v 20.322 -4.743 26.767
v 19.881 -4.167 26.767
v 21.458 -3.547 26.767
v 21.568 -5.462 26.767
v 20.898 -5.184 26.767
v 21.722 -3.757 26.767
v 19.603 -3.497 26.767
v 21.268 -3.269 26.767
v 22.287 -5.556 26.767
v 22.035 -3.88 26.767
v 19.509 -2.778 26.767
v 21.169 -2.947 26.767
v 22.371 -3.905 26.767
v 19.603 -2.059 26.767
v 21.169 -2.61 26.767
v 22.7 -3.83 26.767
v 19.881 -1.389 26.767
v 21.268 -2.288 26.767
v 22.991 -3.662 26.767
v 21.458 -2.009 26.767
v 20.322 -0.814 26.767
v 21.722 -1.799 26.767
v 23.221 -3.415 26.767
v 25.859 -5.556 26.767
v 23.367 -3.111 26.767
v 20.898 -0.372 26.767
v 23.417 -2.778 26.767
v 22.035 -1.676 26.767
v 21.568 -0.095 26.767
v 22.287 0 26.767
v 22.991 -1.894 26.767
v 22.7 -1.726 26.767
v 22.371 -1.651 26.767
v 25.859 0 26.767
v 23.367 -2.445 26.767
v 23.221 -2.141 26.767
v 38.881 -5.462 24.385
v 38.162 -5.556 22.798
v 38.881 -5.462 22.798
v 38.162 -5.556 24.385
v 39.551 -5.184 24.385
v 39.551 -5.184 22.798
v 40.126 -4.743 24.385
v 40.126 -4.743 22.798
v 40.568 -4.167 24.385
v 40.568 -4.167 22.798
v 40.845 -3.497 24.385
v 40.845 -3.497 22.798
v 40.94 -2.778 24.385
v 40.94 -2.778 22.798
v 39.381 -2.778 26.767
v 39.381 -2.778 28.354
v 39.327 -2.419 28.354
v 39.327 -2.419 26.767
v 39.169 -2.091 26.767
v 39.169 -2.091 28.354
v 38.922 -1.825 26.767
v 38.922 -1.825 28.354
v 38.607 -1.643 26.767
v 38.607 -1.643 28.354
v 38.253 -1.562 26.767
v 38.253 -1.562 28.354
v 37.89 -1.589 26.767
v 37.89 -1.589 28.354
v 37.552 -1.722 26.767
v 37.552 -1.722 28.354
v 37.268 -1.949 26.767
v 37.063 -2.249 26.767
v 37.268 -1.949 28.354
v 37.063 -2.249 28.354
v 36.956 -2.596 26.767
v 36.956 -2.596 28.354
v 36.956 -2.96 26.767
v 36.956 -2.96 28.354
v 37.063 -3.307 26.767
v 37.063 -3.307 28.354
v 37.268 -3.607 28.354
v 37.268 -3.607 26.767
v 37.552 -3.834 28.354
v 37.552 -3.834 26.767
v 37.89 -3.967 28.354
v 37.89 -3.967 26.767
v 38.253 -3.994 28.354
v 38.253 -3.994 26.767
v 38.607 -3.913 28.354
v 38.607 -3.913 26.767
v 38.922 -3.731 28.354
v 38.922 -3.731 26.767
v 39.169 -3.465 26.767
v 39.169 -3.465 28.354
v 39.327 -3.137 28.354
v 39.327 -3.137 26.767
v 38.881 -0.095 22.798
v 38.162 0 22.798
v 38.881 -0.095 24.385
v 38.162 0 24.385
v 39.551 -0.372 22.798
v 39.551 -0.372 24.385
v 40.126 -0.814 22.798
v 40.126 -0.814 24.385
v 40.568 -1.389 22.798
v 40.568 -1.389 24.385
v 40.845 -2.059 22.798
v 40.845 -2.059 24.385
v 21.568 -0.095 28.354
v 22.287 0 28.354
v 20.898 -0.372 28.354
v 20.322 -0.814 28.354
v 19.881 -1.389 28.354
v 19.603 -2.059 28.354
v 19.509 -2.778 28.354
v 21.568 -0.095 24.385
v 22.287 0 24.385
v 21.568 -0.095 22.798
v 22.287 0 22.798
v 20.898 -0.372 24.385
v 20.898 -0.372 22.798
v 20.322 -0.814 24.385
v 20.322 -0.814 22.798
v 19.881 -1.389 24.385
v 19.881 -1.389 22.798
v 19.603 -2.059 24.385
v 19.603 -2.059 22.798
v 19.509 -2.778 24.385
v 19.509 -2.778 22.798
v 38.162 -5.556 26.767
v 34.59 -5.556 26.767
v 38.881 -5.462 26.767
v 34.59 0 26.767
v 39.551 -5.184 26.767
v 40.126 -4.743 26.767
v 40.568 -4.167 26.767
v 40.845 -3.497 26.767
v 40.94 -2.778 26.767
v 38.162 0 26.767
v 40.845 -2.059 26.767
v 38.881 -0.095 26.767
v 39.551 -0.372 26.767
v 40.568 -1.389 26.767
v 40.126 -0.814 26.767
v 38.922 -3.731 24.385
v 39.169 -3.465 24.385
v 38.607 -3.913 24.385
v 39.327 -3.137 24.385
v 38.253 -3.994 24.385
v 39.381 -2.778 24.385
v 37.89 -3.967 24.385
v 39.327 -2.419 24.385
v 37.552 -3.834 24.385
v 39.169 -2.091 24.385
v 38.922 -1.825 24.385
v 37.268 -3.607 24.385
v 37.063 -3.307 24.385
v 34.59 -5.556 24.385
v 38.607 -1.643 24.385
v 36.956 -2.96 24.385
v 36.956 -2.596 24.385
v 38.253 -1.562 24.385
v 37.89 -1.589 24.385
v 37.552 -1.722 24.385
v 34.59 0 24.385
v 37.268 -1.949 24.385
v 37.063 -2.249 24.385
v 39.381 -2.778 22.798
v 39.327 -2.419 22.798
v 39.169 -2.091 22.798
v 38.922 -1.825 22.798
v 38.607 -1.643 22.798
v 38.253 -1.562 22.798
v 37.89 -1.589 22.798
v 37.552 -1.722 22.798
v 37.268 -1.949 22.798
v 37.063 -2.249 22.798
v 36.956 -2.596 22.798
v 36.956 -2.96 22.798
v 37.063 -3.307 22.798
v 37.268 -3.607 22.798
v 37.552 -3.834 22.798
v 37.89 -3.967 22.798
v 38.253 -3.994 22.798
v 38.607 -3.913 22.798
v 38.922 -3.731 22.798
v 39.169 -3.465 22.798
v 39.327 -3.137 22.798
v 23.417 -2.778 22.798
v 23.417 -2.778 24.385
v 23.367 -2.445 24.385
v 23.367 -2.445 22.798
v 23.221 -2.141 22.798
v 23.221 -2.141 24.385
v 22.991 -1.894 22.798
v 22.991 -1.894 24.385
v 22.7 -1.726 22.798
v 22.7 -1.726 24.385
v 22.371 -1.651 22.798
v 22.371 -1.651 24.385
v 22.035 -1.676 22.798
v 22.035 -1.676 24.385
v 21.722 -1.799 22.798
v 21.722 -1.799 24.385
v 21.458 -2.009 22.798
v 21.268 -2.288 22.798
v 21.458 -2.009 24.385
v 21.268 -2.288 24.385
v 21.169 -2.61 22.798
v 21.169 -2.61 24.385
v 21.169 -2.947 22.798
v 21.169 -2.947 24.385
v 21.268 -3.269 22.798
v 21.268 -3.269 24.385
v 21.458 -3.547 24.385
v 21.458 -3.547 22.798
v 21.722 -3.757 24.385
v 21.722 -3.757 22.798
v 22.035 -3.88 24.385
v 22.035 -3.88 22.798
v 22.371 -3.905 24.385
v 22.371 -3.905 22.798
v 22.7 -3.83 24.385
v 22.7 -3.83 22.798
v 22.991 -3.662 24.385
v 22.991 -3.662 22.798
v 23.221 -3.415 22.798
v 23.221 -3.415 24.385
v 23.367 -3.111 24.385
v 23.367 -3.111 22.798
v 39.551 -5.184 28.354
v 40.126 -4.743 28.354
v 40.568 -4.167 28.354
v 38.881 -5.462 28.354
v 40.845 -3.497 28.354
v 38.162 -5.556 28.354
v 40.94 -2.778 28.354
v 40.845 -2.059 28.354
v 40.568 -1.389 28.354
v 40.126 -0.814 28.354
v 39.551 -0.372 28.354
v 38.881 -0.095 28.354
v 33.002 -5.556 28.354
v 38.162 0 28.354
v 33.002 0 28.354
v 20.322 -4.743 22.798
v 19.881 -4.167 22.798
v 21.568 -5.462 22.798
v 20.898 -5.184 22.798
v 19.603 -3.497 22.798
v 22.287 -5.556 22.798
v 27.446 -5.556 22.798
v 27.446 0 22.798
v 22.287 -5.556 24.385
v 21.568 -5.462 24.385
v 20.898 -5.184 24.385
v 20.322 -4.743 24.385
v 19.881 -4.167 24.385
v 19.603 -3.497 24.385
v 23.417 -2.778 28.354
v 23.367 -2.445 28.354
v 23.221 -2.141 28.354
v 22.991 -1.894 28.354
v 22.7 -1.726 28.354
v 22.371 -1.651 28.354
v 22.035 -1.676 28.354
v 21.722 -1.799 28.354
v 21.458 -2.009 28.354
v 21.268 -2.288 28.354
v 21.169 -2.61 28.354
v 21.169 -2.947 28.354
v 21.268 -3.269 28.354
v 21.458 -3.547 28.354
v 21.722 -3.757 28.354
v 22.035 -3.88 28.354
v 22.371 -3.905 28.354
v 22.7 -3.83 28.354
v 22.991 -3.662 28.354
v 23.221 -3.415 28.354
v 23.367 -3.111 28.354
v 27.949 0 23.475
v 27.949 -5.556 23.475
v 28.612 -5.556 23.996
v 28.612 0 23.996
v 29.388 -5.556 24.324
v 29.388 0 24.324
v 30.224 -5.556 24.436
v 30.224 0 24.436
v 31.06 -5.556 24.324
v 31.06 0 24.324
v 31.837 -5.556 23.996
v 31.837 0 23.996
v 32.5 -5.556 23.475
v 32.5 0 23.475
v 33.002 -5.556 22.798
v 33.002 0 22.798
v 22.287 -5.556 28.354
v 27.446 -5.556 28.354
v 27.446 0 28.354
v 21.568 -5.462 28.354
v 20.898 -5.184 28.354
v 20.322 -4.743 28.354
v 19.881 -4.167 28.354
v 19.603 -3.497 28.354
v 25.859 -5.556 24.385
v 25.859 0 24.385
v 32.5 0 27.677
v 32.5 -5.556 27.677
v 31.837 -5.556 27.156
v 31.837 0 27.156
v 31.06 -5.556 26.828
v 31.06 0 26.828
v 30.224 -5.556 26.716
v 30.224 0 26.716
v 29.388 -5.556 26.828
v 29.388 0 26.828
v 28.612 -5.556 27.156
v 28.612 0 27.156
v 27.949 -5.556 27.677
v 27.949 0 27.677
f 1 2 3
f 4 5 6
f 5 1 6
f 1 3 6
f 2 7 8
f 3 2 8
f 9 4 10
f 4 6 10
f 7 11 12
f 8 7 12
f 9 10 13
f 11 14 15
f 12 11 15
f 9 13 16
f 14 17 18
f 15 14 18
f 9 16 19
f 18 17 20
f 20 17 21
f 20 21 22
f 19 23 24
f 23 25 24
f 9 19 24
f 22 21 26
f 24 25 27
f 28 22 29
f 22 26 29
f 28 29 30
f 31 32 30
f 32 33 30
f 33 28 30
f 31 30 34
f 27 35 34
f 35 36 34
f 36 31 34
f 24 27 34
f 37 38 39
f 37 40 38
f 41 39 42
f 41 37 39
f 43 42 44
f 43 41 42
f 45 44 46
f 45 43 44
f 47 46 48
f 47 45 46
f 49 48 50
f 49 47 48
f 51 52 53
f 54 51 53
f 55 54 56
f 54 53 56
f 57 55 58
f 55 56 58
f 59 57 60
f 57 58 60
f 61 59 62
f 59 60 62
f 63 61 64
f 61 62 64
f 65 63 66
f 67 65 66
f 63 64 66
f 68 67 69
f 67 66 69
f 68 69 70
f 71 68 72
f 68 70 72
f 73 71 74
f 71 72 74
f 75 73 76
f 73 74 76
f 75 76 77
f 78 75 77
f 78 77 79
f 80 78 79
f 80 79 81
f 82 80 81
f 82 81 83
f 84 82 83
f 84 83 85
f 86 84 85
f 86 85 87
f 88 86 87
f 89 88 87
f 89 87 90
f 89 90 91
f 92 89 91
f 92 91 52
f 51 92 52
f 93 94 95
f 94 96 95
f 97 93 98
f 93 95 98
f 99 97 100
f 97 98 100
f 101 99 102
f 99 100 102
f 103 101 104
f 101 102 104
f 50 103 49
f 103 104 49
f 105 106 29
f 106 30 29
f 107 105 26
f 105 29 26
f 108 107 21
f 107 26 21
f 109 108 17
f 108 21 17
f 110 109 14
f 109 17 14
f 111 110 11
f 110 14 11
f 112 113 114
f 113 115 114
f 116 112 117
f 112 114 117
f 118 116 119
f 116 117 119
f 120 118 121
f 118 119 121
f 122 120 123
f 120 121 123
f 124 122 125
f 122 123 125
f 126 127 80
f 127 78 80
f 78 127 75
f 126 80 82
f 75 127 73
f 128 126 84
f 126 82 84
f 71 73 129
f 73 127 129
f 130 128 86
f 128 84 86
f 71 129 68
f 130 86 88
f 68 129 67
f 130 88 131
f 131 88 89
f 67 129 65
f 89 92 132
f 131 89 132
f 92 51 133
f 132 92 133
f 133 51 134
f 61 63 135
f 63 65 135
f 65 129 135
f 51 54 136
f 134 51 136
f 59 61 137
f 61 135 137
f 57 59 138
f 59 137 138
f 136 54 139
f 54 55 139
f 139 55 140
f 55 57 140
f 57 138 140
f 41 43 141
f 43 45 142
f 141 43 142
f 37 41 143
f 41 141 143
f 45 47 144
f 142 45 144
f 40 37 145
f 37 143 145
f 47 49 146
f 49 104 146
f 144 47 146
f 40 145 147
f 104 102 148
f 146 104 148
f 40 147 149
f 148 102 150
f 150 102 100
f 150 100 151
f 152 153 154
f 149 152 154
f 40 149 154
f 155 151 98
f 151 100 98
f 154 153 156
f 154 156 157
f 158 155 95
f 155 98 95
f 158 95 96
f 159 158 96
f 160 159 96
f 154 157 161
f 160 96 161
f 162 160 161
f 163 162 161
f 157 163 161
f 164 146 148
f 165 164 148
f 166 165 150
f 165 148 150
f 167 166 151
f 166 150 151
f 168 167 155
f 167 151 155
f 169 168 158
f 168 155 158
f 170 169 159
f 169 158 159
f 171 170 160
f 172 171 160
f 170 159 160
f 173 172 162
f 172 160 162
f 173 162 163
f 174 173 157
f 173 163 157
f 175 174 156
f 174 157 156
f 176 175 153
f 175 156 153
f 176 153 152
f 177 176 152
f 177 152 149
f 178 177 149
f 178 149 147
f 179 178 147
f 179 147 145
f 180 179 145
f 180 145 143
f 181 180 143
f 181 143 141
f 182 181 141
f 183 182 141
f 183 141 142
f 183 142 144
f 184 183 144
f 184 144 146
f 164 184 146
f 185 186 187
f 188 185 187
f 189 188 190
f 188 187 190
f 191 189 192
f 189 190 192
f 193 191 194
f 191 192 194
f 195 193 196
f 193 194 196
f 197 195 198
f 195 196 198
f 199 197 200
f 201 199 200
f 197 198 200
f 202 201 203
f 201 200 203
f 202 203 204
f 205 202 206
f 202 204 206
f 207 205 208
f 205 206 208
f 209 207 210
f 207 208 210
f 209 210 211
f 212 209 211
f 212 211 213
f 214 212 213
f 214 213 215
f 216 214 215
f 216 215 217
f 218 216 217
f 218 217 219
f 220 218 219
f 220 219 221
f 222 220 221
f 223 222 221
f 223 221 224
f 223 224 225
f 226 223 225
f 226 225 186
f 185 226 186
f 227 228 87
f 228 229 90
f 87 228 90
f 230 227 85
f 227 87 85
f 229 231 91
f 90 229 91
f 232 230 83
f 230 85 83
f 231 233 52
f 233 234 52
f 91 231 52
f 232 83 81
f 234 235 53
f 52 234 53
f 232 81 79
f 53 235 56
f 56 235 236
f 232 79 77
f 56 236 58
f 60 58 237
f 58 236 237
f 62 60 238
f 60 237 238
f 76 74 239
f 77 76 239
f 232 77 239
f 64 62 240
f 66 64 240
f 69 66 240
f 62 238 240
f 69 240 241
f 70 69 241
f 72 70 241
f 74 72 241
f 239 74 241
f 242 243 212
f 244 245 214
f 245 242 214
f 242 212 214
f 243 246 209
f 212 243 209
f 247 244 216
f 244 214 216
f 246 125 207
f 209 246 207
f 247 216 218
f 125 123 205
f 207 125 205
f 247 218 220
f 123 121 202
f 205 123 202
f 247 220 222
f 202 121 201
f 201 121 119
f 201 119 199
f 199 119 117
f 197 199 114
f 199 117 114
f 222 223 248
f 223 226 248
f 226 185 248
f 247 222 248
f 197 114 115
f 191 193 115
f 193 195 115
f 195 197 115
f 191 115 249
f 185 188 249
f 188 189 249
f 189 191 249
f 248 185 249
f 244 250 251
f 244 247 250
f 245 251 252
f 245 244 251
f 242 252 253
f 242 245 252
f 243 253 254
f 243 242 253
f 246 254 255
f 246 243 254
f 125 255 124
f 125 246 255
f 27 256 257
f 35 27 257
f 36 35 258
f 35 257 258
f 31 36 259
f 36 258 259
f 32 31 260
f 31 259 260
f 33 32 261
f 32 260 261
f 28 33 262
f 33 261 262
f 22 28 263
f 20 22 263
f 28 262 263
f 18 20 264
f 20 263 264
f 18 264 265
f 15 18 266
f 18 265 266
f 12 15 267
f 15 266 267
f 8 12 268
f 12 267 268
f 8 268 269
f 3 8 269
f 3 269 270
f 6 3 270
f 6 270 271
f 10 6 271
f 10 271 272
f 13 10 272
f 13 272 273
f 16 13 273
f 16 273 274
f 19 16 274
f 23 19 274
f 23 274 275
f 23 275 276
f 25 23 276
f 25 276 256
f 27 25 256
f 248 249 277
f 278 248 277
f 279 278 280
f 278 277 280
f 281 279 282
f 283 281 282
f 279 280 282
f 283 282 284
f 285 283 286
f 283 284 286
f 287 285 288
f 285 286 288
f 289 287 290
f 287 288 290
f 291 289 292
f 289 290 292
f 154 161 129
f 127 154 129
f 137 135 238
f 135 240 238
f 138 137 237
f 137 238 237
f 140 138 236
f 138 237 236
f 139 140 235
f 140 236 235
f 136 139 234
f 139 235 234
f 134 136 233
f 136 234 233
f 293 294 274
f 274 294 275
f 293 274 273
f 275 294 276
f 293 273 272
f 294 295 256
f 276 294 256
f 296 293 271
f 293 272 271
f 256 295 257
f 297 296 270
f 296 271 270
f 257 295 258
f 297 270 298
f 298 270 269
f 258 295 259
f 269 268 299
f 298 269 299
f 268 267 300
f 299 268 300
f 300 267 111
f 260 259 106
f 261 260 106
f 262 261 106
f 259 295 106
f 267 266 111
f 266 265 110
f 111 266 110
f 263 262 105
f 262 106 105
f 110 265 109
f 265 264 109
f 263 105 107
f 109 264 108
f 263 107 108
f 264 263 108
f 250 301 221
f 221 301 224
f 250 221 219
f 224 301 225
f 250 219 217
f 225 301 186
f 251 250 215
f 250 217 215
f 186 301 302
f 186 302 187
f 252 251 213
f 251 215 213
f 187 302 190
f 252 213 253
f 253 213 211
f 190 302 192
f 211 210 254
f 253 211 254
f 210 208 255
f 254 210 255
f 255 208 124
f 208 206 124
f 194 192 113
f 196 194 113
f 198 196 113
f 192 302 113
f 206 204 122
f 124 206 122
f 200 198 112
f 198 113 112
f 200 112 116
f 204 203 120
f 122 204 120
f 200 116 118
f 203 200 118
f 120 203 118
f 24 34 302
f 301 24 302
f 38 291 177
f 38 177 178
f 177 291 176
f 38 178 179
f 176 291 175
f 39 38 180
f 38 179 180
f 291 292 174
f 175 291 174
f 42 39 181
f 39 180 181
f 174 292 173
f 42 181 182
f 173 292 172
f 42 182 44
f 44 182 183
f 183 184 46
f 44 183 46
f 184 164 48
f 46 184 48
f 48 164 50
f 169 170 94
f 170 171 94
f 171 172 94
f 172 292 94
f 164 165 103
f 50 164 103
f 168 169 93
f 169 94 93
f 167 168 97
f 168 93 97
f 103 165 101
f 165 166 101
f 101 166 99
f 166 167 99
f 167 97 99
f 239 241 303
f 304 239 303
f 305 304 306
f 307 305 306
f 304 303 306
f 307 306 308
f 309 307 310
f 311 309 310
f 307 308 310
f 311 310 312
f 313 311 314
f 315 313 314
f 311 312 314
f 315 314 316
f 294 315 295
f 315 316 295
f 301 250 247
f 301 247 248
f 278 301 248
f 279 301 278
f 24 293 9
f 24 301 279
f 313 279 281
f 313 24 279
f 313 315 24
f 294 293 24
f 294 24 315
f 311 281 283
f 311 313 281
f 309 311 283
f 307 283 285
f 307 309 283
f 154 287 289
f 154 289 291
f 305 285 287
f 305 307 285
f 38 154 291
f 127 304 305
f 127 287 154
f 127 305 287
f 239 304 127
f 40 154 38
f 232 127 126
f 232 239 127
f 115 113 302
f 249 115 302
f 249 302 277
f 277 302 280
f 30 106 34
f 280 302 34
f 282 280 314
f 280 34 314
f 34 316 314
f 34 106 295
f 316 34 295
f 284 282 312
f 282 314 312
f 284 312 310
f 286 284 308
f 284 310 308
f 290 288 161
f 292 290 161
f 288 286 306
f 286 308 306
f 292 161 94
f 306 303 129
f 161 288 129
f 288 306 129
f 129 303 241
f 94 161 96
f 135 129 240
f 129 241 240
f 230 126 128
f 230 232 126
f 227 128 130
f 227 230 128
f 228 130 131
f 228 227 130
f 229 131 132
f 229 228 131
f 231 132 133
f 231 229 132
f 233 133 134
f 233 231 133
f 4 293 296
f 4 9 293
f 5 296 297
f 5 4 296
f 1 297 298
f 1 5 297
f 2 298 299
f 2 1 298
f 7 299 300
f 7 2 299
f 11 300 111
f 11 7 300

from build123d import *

# Parameters (mm, degrees)
F1_DEPTH = 5.55625
F2_R     = 1.1303
F2_R_2   = 1.2192
F3_DEPTH = 25.4
F4_R     = 2.778115


# Not quite as in the source:
# - a fillet or chamfer is up to 0.001 mm smaller than in the source, because OpenCascade refuses the exact size


with BuildPart() as f1:
    # F0 (on Front) → F1 (new body)
    with BuildSketch(Plane.XZ):
        Polygon((27.4460728326, 28.3541232628), (19.5085728326, 28.3541232628), (19.5085728326, 26.7666232628), (25.8585728326, 26.7666232628), (25.8585728326, 24.3853732628), (19.5085728326, 24.3853732628), (19.5085728326, 22.7978732628), (27.4460728326, 22.7978732628), align=None)
        with BuildLine():
            ThreePointArc((33.0023228326, 28.3541232628), (30.2241978326, 26.7162135284), (27.4460728326, 28.3541232628))
            Line((27.4460728326, 28.3541232628), (27.4460728326, 22.7978732628))
            ThreePointArc((27.4460728326, 22.7978732628), (30.2241978326, 24.4357829973), (33.0023228326, 22.7978732628))
            Line((33.0023228326, 22.7978732628), (33.0023228326, 28.3541232628))
        make_face()
        Polygon((40.9398228326, 28.3541232628), (33.0023228326, 28.3541232628), (33.0023228326, 22.7978732628), (40.9398228326, 22.7978732628), (40.9398228326, 24.3853732628), (34.5898228326, 24.3853732628), (34.5898228326, 26.7666232628), (40.9398228326, 26.7666232628), align=None)
    extrude(amount=F1_DEPTH)

    # F2 (on face) → F3 (cut)
    with BuildSketch(Plane.XY.offset(28.3541232628)):
        with Locations((22.2866978326, -2.778125)):
            Circle(F2_R)
        with Locations((38.1616978326, -2.778125)):
            Circle(F2_R_2)
    extrude(amount=-F3_DEPTH, mode=Mode.SUBTRACT)

    # F4 (radius 2.778125 in the source; OpenCascade refuses exactly that, so slightly less here)
    f4_edges = [f1.edges().sort_by_distance(p)[0] for p in [
        (19.508573, 0, 23.591623),
        (19.508573, 0, 27.560373),
        (19.508573, -5.55625, 27.560373),
        (19.508573, -5.55625, 23.591623),
        (40.939823, 0, 23.591623),
        (40.939823, 0, 27.560373),
        (40.939823, -5.55625, 23.591623),
        (40.939823, -5.55625, 27.560373),
    ]]
    fillet(f4_edges, radius=F4_R)


solid = f1.part
